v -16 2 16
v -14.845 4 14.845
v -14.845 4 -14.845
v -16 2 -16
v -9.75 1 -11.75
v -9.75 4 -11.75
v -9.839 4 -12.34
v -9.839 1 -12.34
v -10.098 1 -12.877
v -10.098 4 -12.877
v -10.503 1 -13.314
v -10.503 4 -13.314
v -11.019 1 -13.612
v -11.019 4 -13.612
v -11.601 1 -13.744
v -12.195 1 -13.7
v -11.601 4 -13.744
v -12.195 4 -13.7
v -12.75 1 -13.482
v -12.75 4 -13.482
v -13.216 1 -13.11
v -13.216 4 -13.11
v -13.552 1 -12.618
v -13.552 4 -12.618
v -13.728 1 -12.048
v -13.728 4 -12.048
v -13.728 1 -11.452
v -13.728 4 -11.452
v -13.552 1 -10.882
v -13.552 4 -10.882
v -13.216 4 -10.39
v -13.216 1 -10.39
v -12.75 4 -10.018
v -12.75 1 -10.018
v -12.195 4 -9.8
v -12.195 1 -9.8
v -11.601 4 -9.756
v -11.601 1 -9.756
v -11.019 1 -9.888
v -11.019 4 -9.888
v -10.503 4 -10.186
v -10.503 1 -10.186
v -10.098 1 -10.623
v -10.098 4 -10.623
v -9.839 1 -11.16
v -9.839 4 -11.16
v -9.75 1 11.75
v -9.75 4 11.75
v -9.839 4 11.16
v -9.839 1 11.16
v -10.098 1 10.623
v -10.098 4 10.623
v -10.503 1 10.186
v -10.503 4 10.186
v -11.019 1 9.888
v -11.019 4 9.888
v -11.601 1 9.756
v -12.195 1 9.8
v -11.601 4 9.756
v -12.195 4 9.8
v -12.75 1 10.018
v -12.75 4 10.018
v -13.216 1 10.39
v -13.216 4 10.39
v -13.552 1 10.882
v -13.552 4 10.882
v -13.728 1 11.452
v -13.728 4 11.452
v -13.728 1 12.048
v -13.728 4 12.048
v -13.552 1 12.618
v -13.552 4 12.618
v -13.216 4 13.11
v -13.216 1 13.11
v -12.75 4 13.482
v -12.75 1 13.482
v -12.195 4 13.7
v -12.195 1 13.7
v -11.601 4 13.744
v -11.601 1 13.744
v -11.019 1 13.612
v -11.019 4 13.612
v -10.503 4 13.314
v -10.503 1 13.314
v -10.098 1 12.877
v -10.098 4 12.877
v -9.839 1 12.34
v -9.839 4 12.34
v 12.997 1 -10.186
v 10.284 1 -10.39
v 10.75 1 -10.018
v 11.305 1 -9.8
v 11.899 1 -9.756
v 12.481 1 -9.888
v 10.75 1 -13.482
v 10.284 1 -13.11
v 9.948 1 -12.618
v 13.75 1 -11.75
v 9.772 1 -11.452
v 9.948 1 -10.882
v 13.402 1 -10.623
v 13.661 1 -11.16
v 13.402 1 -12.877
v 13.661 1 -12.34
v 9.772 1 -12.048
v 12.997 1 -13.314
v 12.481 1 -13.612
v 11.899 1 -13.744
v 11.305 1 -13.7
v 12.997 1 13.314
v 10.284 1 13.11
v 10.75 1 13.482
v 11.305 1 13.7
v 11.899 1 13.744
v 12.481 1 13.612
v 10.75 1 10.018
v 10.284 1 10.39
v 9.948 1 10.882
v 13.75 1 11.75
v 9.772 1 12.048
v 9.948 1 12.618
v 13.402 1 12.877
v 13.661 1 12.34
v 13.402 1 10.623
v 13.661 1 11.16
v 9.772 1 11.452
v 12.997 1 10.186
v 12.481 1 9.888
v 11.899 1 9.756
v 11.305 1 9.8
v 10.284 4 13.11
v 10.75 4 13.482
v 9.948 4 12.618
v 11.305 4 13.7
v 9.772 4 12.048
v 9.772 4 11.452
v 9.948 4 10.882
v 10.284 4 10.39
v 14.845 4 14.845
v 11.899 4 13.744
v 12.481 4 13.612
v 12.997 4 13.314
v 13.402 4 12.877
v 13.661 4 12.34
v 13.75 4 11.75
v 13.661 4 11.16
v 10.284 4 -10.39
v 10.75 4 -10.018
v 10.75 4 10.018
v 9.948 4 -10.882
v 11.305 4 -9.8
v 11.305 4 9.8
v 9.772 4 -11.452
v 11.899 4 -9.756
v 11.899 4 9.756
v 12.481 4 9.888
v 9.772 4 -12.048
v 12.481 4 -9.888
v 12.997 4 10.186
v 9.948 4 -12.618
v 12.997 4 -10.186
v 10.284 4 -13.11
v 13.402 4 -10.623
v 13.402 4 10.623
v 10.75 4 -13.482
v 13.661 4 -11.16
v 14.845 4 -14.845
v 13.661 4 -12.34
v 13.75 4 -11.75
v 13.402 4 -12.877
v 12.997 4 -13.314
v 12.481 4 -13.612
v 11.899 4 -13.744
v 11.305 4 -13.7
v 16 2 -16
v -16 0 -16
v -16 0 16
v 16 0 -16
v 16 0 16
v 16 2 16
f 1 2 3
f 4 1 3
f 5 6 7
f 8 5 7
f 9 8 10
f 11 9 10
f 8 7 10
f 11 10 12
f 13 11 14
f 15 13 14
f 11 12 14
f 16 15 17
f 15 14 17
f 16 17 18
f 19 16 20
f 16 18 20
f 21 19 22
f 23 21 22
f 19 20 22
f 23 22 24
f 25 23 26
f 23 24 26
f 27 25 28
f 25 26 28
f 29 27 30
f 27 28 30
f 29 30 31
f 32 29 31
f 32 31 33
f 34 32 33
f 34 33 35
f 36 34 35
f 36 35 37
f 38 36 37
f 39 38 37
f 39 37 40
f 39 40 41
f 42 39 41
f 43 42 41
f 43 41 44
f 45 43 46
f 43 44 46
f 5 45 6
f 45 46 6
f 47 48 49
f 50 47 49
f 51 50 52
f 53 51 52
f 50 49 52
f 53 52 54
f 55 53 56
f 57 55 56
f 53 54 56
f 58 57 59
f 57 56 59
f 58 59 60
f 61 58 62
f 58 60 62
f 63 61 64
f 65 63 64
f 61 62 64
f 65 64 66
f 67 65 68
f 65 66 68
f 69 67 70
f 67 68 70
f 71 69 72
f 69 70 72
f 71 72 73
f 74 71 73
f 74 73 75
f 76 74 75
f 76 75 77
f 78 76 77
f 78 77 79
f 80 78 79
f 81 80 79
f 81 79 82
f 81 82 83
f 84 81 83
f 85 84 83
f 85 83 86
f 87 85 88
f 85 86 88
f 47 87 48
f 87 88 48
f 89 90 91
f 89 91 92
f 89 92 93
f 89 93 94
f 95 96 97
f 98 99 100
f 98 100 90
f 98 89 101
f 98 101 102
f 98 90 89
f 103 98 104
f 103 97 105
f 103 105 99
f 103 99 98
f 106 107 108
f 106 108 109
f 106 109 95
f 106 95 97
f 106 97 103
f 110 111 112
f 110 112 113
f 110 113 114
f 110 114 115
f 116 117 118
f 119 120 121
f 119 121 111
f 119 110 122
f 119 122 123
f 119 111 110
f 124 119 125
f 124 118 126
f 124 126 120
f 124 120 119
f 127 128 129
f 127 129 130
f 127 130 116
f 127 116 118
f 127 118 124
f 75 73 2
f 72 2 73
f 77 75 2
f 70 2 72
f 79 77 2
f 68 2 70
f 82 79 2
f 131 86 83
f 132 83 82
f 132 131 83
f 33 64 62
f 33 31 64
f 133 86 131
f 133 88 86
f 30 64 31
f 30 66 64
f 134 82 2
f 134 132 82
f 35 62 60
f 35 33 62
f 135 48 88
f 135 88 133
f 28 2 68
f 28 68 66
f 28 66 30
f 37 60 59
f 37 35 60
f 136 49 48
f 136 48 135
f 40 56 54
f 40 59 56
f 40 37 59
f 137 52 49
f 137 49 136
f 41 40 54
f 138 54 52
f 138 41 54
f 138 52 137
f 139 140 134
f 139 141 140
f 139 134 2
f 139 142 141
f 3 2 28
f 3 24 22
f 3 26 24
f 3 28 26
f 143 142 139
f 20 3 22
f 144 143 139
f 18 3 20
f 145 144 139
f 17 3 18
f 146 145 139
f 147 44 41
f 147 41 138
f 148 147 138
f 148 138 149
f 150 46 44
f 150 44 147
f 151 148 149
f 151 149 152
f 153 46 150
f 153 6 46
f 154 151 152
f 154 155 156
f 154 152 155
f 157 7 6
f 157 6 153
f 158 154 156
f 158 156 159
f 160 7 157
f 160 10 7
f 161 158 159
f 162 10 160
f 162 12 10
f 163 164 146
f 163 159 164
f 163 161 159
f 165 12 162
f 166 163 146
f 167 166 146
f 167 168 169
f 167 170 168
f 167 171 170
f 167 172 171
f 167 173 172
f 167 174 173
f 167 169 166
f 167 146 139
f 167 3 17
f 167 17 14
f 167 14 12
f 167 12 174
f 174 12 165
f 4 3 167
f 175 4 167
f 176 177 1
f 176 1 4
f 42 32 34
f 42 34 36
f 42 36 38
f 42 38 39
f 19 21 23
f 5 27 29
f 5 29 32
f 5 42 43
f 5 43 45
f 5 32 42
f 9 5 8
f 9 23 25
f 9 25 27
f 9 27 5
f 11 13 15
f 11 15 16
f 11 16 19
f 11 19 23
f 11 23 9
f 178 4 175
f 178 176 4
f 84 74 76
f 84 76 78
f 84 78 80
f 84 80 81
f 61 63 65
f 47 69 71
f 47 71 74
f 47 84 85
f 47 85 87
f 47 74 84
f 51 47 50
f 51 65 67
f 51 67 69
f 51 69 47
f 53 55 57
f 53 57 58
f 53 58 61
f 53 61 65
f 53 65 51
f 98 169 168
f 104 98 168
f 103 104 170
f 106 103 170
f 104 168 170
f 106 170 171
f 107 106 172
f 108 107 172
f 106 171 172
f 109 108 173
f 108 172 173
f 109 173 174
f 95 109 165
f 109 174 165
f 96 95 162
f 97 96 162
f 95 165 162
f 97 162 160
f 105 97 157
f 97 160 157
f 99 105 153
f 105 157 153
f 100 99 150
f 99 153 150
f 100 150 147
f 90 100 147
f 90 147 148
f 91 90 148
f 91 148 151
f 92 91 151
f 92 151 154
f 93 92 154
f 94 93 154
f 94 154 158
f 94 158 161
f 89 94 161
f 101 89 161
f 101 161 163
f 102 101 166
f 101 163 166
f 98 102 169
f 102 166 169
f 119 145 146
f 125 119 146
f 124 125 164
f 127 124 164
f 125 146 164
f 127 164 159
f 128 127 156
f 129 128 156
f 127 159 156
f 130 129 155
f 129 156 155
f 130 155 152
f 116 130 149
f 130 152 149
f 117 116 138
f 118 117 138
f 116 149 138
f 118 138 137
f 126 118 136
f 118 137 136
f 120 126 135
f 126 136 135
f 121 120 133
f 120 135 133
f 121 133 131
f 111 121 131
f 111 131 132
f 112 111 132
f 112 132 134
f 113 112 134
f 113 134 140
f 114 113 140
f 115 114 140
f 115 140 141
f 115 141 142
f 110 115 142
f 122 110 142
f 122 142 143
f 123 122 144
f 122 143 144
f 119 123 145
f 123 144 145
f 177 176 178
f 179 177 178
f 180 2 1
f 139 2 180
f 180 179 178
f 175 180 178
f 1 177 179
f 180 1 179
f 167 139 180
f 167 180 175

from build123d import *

# Parameters (mm, degrees)
SKETCH1_W             = 32
SKETCH1_H             = 32
BOSS_EXTRUDE1_DEPTH   = 4
SKETCH2_R             = 2
CUT_EXTRUDE1_DEPTH    = 3
CHAMFER1_SIZE         = 2
CHAMFER1_SIZE2        = 1.154700538
CHAMFER1_PART_2_SIZE  = 2
CHAMFER1_PART_2_SIZE2 = 1.154700538
CHAMFER1_PART_3_SIZE  = 2
CHAMFER1_PART_3_SIZE2 = 1.154700538
CHAMFER1_PART_4_SIZE  = 2
CHAMFER1_PART_4_SIZE2 = 1.154700538


with BuildPart() as part:
    # Sketch1 → Boss-Extrude1 (new body)
    with BuildSketch(Plane(origin=(0, 0, 0), x_dir=(1, 0, 0), z_dir=(0, 1, 0))):
        Rectangle(SKETCH1_W, SKETCH1_H)
    extrude(amount=BOSS_EXTRUDE1_DEPTH)

    # Sketch2 → Cut-Extrude1 (cut)
    with BuildSketch(Plane(origin=(0, 4, 0), x_dir=(1, 0, 0), z_dir=(0, 1, 0))):
        with Locations((-11.75, 11.75)):
            Circle(SKETCH2_R)
        with Locations((11.75, 11.75)):
            Circle(SKETCH2_R)
        with Locations((11.75, -11.75)):
            Circle(SKETCH2_R)
        with Locations((-11.75, -11.75)):
            Circle(SKETCH2_R)
    extrude(amount=-CUT_EXTRUDE1_DEPTH, mode=Mode.SUBTRACT)

    # Chamfer1
    chamfer1_edges = [part.edges().sort_by_distance(p)[0] for p in [
        (-16, 4, 0),
    ]]
    chamfer1_side = [part.faces().sort_by_distance(p)[0] for p in [
        (-16, 2, 0),
    ]]
    chamfer(chamfer1_edges, length=CHAMFER1_SIZE, length2=CHAMFER1_SIZE2, reference=chamfer1_side[0])

    # Chamfer1 part 2
    chamfer1_part_2_edges = [part.edges().sort_by_distance(p)[0] for p in [
        (0, 4, 16),
    ]]
    chamfer1_part_2_side = [part.faces().sort_by_distance(p)[0] for p in [
        (0, 2, 16),
    ]]
    chamfer(chamfer1_part_2_edges, length=CHAMFER1_PART_2_SIZE, length2=CHAMFER1_PART_2_SIZE2, reference=chamfer1_part_2_side[0])

    # Chamfer1 part 3
    chamfer1_part_3_edges = [part.edges().sort_by_distance(p)[0] for p in [
        (16, 4, 0),
    ]]
    chamfer1_part_3_side = [part.faces().sort_by_distance(p)[0] for p in [
        (16, 2, 0),
    ]]
    chamfer(chamfer1_part_3_edges, length=CHAMFER1_PART_3_SIZE, length2=CHAMFER1_PART_3_SIZE2, reference=chamfer1_part_3_side[0])

    # Chamfer1 part 4
    chamfer1_part_4_edges = [part.edges().sort_by_distance(p)[0] for p in [
        (0, 4, -16),
    ]]
    chamfer1_part_4_side = [part.faces().sort_by_distance(p)[0] for p in [
        (0, 2, -16),
    ]]
    chamfer(chamfer1_part_4_edges, length=CHAMFER1_PART_4_SIZE, length2=CHAMFER1_PART_4_SIZE2, reference=chamfer1_part_4_side[0])


solid = part.part
